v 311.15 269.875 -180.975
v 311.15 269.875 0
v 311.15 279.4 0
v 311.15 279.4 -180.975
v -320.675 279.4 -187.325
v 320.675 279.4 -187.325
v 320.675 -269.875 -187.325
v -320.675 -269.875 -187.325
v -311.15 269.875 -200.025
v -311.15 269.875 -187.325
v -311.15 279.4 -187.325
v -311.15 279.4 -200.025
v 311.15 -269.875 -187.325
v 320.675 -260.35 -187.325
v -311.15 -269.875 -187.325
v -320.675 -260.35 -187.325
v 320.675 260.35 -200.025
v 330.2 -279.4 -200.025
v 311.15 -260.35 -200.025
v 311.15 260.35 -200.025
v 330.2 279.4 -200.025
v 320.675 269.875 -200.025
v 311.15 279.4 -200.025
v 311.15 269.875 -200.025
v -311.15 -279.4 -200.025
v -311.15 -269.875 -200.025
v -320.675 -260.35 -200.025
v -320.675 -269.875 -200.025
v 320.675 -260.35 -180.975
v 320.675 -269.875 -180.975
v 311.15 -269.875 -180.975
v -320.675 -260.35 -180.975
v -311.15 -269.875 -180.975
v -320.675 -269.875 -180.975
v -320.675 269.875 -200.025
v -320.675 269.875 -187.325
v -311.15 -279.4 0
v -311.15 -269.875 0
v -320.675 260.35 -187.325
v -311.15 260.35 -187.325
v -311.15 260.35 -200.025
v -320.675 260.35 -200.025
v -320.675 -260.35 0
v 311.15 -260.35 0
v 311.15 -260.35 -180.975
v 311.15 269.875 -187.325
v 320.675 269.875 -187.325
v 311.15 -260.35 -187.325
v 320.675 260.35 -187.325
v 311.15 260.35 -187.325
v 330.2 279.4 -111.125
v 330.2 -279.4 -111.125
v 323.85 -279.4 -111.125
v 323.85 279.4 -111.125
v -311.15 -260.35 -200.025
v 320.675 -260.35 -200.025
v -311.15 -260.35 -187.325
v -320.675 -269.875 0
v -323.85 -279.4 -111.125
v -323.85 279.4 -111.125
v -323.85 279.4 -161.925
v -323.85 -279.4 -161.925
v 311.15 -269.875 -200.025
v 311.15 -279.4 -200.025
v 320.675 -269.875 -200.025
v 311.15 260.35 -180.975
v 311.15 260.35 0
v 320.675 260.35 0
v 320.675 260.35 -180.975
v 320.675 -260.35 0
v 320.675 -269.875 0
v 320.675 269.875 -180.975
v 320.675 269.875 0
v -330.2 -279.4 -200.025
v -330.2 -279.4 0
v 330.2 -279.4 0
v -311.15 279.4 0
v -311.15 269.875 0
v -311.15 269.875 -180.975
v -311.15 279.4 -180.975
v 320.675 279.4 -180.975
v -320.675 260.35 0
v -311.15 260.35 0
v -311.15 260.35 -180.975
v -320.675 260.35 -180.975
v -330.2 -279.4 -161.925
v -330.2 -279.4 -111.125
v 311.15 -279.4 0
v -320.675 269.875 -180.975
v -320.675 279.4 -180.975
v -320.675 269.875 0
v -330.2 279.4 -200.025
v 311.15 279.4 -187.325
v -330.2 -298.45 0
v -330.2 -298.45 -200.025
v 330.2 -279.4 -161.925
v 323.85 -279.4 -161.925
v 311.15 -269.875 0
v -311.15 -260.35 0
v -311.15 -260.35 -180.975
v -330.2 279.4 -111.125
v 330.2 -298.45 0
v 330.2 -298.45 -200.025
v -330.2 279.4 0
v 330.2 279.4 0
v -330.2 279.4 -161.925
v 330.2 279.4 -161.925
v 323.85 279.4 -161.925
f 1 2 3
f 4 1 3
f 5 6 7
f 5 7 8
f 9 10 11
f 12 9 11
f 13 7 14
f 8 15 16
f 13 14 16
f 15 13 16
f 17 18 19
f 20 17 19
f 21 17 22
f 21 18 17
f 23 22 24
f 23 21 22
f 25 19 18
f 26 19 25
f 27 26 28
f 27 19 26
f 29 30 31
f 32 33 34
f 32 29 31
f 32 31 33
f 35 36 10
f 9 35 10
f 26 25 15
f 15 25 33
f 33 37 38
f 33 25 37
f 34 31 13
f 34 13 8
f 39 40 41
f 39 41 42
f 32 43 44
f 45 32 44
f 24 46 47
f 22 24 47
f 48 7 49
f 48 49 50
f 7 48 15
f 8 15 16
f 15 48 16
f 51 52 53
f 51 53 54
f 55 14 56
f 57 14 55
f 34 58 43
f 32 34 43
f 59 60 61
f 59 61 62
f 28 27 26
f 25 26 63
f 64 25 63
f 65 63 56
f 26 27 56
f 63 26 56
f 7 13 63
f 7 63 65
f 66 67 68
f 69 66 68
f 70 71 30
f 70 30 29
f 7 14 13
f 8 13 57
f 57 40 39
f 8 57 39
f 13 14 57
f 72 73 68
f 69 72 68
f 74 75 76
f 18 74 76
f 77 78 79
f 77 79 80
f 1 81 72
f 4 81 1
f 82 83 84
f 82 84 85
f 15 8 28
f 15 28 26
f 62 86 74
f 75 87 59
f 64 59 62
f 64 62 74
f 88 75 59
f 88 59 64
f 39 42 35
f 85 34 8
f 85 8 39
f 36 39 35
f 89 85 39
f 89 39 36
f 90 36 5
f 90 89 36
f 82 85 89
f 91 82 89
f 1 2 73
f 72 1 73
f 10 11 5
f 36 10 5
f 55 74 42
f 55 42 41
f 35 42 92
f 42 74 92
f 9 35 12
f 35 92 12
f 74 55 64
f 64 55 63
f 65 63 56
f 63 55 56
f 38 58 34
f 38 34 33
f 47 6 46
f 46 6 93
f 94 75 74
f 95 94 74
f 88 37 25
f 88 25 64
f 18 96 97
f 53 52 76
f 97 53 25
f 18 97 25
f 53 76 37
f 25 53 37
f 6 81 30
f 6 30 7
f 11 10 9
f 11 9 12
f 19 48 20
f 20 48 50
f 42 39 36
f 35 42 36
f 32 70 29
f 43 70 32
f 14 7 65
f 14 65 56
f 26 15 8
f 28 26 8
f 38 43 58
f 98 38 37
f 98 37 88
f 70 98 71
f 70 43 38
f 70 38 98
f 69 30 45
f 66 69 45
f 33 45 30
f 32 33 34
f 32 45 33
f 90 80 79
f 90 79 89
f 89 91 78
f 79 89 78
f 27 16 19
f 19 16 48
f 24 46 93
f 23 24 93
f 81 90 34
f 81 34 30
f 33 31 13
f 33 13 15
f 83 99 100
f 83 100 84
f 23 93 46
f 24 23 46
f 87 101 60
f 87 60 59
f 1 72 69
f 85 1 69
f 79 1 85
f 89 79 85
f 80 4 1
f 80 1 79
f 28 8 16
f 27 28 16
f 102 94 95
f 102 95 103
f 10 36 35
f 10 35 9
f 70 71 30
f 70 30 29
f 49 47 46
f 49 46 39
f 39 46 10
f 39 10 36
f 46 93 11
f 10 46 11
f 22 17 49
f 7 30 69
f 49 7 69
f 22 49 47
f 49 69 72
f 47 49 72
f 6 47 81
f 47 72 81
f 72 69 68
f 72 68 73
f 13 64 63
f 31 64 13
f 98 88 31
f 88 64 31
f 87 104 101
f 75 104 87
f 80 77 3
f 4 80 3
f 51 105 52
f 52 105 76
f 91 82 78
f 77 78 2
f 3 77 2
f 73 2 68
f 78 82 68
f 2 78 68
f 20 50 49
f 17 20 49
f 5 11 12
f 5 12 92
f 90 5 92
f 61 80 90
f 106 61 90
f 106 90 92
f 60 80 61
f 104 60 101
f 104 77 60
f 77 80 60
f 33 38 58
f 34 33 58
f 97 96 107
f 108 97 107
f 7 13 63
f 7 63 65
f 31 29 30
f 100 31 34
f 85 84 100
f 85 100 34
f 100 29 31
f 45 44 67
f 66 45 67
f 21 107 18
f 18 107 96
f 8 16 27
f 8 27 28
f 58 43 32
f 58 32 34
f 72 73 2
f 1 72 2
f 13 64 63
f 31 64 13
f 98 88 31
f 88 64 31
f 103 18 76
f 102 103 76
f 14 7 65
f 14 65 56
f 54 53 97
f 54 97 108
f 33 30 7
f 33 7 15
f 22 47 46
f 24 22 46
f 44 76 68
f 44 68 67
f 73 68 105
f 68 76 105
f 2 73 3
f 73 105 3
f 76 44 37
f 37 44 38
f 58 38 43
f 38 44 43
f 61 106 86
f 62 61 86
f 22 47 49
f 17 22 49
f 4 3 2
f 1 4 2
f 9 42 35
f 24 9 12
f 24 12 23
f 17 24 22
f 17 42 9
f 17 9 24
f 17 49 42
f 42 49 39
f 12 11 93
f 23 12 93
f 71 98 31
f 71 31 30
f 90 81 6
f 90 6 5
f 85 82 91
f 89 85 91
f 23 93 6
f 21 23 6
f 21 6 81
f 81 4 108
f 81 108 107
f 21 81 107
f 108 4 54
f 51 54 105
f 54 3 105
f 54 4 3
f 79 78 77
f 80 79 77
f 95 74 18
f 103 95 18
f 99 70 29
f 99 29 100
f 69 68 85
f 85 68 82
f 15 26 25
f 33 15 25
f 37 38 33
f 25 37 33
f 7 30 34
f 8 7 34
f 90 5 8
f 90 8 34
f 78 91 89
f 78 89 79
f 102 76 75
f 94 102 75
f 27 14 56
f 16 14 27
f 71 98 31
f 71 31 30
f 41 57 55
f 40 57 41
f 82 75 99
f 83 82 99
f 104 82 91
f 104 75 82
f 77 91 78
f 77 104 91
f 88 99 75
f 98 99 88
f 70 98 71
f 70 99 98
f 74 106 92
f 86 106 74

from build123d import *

# Parameters (mm, degrees)
F1_DEPTH  = 200.025
F4_DEPTH  = 200.025
F6_W      = 641.35
F6_H      = 6.350001
F7_DEPTH  = 549.275
F9_DEPTH  = 549.275
F11_DEPTH = 19.05
F12_W     = 558.8
F12_H     = 50.8
F13_DEPTH = 6.35
F14_W     = 558.8
F14_H     = 50.8
F15_DEPTH = 6.35


with BuildPart() as f1:
    # F0 (on Top) → F1 (new body)
    with BuildSketch(Plane.XY):
        Polygon((-311.15, -269.875), (-311.15, -279.4), (311.15, -279.4), (311.15, -269.875), (320.675, -269.875), (320.675, -260.35), (-320.675, -260.35), (-320.675, -269.875), align=None)
    extrude(amount=-F1_DEPTH)


with BuildPart() as f2_1:
    # F2: instance of F1
    add(f1.part.mirror(Plane.XZ))


with BuildPart() as f4:
    # F3 (on Top) → F4 (new body)
    with BuildSketch(Plane.XY):
        Polygon((-311.15, 260.35), (-320.675, 260.35), (-320.675, 269.875), (-311.15, 269.875), (-311.15, 279.4), (-330.2, 279.4), (-330.2, -279.4), (-311.15, -279.4), (-311.15, -269.875), (-320.675, -269.875), (-320.675, -260.35), (-311.15, -260.35), align=None)
        Polygon((320.675, -260.35), (-311.15, -260.35), (-320.675, -260.35), (-320.675, -269.875), (-311.15, -269.875), (-311.15, -279.4), (311.15, -279.4), (311.15, -269.875), (320.675, -269.875), align=None)
    extrude(amount=-F4_DEPTH)


with BuildPart() as f5_1:
    # F5: instance of F4
    add(f4.part.mirror(Plane.YZ))


with BuildPart() as f7_tool:
    # F6 (on face) → F7 (new body)
    with BuildSketch(Plane(origin=(0, 279.4, 0), x_dir=(-1, 0, 0), z_dir=(0, 1, 0))):
        with Locations((0, -184.15)):
            Rectangle(F6_W, F6_H)
    extrude(amount=-F7_DEPTH)


with BuildPart() as f1_1:
    add(f1.part)

    # F7: cut by f7_tool
    add(f7_tool.part, mode=Mode.SUBTRACT)


with BuildPart() as f2_1_1:
    add(f2_1.part)

    # F7: cut by f7_tool
    add(f7_tool.part, mode=Mode.SUBTRACT)


with BuildPart() as f4_1:
    add(f4.part)

    # F7: cut by f7_tool
    add(f7_tool.part, mode=Mode.SUBTRACT)

    # F14 (on face) → F15 (cut)
    with BuildSketch(Plane(origin=(-330.2, 0, 0), x_dir=(0, -1, 0), z_dir=(-1, 0, 0))):
        with Locations((0, -136.525)):
            Rectangle(F14_W, F14_H)
    extrude(amount=-F15_DEPTH, mode=Mode.SUBTRACT)


with BuildPart() as f5_1_1:
    add(f5_1.part)

    # F7: cut by f7_tool
    add(f7_tool.part, mode=Mode.SUBTRACT)

    # F12 (on face) → F13 (cut)
    with BuildSketch(Plane.YZ.offset(330.2)):
        with Locations((0, -136.525)):
            Rectangle(F12_W, F12_H)
    extrude(amount=-F13_DEPTH, mode=Mode.SUBTRACT)


with BuildPart() as f9:
    # F8 (on face) → F9 (new body, through all)
    with BuildSketch(Plane(origin=(0, 279.4, 0), x_dir=(-1, 0, 0), z_dir=(0, 1, 0))):
        Polygon((-320.675, -180.975), (-320.675, -187.325001), (-311.15, -187.325001), (311.15, -187.325001), (320.675, -187.325001), (320.675, -180.975), (311.15, -180.975), (-311.15, -180.975), align=None)
    extrude(amount=-F9_DEPTH)


with BuildPart() as f11:
    # F10 (on face) → F11 (new body)
    with BuildSketch(Plane.XZ.offset(279.4)):
        Polygon((-330.2, 0), (-330.2, -200.025), (-311.15, -200.025), (311.15, -200.025), (330.2, -200.025), (330.2, 0), (311.15, 0), (-311.15, 0), align=None)
    extrude(amount=F11_DEPTH)


solid = Compound([f1_1.part, f2_1_1.part, f4_1.part, f5_1_1.part, f9.part, f11.part])
